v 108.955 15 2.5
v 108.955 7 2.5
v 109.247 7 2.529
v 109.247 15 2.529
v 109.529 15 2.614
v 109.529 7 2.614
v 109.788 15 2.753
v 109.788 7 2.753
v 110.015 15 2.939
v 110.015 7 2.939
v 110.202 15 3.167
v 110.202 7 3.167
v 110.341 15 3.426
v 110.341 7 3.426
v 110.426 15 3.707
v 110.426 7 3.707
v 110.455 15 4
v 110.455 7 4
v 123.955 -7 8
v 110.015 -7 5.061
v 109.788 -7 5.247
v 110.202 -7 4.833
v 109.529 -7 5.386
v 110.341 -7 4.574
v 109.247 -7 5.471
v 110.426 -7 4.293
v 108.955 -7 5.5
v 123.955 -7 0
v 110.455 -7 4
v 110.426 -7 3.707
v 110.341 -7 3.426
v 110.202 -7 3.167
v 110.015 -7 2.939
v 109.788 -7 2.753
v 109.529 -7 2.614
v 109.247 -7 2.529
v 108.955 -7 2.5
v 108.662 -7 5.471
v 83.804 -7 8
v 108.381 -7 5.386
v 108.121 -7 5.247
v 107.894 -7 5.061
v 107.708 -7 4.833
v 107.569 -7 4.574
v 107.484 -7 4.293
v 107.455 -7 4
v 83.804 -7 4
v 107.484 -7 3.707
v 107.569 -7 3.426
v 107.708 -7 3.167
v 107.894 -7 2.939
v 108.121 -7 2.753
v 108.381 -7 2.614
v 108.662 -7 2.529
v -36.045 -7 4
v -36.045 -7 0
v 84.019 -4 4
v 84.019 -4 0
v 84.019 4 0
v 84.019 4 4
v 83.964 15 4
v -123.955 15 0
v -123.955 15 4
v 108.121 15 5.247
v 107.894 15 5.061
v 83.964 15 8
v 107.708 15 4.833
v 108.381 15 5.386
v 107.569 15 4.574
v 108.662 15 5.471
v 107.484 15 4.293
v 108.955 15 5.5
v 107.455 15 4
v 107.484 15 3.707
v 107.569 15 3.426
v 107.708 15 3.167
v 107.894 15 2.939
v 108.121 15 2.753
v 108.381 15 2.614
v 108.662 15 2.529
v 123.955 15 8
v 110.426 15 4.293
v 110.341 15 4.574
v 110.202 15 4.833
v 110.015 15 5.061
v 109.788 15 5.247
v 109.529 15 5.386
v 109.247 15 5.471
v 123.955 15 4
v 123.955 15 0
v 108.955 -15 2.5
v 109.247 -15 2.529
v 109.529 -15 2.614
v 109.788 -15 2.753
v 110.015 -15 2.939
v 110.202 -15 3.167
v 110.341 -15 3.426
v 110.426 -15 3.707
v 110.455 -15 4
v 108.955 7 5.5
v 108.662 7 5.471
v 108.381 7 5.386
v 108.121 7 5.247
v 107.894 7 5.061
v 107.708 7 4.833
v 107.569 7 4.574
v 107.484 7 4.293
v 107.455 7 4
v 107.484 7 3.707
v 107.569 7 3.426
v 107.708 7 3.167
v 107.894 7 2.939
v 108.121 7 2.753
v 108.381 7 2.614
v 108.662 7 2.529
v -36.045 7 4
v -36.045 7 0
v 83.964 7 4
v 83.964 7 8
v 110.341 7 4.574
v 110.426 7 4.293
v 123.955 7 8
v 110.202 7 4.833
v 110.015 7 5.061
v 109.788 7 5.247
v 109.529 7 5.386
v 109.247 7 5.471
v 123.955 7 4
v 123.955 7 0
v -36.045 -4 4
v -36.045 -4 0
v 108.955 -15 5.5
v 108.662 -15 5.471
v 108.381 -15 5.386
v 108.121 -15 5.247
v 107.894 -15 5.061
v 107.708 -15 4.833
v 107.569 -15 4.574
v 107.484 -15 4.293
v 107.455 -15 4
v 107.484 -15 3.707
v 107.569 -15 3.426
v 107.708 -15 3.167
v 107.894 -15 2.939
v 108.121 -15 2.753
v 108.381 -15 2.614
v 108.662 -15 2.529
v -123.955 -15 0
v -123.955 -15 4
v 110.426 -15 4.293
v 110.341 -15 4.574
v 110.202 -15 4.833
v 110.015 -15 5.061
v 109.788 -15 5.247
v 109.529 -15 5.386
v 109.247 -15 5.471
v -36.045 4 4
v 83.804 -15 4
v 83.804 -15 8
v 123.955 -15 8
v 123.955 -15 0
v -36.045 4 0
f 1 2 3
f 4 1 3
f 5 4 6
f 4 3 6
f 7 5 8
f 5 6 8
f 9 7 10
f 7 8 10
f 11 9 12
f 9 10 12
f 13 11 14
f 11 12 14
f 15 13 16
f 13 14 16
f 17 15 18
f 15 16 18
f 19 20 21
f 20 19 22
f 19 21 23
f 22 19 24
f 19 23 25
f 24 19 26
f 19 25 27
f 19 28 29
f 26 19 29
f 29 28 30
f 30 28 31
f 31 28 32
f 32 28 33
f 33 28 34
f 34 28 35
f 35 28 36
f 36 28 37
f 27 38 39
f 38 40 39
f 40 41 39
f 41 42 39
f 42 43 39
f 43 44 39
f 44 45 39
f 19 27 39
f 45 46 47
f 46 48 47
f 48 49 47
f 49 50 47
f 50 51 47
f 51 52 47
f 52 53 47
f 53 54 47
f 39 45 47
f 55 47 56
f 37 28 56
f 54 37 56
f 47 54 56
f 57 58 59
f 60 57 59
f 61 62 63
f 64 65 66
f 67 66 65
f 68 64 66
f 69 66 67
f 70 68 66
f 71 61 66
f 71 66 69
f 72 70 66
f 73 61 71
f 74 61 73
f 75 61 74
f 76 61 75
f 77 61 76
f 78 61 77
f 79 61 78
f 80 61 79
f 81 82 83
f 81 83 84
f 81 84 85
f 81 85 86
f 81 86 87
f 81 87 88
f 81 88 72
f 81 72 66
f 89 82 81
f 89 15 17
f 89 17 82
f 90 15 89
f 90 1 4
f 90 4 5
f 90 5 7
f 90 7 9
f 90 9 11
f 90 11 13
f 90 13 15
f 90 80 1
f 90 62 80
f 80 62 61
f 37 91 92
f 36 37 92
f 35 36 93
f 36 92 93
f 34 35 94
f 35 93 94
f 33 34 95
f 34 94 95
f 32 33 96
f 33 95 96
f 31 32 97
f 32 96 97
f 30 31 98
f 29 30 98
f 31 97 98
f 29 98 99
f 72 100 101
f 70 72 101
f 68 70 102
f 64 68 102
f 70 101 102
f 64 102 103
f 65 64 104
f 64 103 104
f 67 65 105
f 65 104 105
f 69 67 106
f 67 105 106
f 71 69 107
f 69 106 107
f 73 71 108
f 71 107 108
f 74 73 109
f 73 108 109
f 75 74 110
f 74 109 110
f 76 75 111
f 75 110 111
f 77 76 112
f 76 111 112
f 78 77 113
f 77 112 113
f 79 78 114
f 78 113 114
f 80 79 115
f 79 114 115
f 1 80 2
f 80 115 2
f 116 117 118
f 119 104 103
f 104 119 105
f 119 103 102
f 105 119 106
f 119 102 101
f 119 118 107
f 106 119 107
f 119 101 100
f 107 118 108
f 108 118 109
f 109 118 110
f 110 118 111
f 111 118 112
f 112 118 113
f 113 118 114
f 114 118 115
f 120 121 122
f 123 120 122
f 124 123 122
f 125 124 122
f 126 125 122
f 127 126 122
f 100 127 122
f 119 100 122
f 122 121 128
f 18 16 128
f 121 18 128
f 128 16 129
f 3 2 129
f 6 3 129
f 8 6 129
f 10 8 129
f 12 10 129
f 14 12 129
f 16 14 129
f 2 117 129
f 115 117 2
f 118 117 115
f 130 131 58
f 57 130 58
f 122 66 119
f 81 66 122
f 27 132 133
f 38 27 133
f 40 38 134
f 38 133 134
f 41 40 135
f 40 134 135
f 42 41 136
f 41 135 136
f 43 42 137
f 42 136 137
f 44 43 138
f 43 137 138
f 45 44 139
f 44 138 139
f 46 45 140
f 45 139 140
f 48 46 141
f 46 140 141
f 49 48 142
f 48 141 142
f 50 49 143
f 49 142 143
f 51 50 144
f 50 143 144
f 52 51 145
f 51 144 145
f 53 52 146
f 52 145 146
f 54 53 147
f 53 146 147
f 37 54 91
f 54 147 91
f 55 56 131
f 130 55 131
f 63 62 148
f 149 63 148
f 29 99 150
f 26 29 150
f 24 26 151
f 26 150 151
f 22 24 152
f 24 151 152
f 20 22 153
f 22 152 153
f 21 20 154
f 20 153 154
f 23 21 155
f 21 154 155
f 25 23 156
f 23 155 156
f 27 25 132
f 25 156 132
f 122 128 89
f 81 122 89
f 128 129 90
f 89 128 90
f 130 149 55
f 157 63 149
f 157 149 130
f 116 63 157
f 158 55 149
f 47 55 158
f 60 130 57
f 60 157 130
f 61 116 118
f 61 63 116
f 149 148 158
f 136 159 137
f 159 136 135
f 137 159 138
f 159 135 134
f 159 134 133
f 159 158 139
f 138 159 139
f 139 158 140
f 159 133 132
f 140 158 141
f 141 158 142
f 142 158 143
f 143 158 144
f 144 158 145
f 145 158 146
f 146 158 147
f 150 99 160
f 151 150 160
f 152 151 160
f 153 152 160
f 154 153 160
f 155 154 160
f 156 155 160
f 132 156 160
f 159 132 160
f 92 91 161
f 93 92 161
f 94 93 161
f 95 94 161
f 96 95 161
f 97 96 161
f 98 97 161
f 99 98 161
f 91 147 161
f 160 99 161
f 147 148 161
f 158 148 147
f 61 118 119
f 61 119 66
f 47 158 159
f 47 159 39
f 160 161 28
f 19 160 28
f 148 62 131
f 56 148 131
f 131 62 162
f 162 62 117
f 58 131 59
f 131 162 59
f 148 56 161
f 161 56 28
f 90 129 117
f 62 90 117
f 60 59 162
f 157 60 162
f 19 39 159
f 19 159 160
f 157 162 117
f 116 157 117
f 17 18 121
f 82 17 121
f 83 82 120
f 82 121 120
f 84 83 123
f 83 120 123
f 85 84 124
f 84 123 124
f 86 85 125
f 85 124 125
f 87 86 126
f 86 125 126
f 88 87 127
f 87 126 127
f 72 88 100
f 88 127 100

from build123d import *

# Parameters (mm, degrees)
F1_DEPTH = 4
F2_W     = 39.9907242665
F2_H     = 8
F2_W_2   = 40.1504870662
F3_DEPTH = 4
F4_DEPTH = 4
F6_DEPTH = 101


with BuildPart() as f1:
    # F0 (on Top) → F1 (new body)
    with BuildSketch(Plane.XY):
        Polygon((-123.9547070274, -15), (123.9547070274, -15), (123.9547070274, -7), (-36.0452929726, -7), (-36.0452929726, -4), (84.0192064643, -4), (84.0192064643, 4), (83.9637443423, 4), (83.9547070274, 4), (-36.0452929726, 4), (-36.0452929726, 7), (123.9547070274, 7), (123.9547070274, 15), (-123.9547070274, 15), align=None)
    extrude(amount=F1_DEPTH)

    # F2 (on face) → F3 (join)
    with BuildSketch(Plane.XY.offset(4)):
        with Locations((103.9593448941, 11)):
            Rectangle(F2_W, F2_H)
        with Locations((103.8794634943, -11)):
            Rectangle(F2_W_2, F2_H)
    extrude(amount=F3_DEPTH)

    # F2 (on face) → F4 (join)
    with BuildSketch(Plane.XY.offset(4)):
        with Locations((103.9593448941, 11)):
            Rectangle(F2_W, F2_H)
        with Locations((103.8794634943, -11)):
            Rectangle(F2_W_2, F2_H)
    extrude(amount=F4_DEPTH)

    # F5 (on face) → F6 (cut)
    with BuildSketch(Plane.XZ.offset(15)):
        with BuildLine():
            ThreePointArc((110.4547070274, 4), (110.0153671992, 5.0606601718), (108.9547070274, 5.5))
            Line((108.9547070274, 5.5), (108.9547070274, 2.5))
            ThreePointArc((108.9547070274, 2.5), (110.0153671992, 2.9393398282), (110.4547070274, 4))
        make_face()
        with BuildLine():
            Line((108.9547070274, 2.5), (108.9547070274, 5.5))
            ThreePointArc((108.9547070274, 5.5), (107.4547070274, 4), (108.9547070274, 2.5))
        make_face()
    extrude(amount=-F6_DEPTH, mode=Mode.SUBTRACT)


solid = f1.part
